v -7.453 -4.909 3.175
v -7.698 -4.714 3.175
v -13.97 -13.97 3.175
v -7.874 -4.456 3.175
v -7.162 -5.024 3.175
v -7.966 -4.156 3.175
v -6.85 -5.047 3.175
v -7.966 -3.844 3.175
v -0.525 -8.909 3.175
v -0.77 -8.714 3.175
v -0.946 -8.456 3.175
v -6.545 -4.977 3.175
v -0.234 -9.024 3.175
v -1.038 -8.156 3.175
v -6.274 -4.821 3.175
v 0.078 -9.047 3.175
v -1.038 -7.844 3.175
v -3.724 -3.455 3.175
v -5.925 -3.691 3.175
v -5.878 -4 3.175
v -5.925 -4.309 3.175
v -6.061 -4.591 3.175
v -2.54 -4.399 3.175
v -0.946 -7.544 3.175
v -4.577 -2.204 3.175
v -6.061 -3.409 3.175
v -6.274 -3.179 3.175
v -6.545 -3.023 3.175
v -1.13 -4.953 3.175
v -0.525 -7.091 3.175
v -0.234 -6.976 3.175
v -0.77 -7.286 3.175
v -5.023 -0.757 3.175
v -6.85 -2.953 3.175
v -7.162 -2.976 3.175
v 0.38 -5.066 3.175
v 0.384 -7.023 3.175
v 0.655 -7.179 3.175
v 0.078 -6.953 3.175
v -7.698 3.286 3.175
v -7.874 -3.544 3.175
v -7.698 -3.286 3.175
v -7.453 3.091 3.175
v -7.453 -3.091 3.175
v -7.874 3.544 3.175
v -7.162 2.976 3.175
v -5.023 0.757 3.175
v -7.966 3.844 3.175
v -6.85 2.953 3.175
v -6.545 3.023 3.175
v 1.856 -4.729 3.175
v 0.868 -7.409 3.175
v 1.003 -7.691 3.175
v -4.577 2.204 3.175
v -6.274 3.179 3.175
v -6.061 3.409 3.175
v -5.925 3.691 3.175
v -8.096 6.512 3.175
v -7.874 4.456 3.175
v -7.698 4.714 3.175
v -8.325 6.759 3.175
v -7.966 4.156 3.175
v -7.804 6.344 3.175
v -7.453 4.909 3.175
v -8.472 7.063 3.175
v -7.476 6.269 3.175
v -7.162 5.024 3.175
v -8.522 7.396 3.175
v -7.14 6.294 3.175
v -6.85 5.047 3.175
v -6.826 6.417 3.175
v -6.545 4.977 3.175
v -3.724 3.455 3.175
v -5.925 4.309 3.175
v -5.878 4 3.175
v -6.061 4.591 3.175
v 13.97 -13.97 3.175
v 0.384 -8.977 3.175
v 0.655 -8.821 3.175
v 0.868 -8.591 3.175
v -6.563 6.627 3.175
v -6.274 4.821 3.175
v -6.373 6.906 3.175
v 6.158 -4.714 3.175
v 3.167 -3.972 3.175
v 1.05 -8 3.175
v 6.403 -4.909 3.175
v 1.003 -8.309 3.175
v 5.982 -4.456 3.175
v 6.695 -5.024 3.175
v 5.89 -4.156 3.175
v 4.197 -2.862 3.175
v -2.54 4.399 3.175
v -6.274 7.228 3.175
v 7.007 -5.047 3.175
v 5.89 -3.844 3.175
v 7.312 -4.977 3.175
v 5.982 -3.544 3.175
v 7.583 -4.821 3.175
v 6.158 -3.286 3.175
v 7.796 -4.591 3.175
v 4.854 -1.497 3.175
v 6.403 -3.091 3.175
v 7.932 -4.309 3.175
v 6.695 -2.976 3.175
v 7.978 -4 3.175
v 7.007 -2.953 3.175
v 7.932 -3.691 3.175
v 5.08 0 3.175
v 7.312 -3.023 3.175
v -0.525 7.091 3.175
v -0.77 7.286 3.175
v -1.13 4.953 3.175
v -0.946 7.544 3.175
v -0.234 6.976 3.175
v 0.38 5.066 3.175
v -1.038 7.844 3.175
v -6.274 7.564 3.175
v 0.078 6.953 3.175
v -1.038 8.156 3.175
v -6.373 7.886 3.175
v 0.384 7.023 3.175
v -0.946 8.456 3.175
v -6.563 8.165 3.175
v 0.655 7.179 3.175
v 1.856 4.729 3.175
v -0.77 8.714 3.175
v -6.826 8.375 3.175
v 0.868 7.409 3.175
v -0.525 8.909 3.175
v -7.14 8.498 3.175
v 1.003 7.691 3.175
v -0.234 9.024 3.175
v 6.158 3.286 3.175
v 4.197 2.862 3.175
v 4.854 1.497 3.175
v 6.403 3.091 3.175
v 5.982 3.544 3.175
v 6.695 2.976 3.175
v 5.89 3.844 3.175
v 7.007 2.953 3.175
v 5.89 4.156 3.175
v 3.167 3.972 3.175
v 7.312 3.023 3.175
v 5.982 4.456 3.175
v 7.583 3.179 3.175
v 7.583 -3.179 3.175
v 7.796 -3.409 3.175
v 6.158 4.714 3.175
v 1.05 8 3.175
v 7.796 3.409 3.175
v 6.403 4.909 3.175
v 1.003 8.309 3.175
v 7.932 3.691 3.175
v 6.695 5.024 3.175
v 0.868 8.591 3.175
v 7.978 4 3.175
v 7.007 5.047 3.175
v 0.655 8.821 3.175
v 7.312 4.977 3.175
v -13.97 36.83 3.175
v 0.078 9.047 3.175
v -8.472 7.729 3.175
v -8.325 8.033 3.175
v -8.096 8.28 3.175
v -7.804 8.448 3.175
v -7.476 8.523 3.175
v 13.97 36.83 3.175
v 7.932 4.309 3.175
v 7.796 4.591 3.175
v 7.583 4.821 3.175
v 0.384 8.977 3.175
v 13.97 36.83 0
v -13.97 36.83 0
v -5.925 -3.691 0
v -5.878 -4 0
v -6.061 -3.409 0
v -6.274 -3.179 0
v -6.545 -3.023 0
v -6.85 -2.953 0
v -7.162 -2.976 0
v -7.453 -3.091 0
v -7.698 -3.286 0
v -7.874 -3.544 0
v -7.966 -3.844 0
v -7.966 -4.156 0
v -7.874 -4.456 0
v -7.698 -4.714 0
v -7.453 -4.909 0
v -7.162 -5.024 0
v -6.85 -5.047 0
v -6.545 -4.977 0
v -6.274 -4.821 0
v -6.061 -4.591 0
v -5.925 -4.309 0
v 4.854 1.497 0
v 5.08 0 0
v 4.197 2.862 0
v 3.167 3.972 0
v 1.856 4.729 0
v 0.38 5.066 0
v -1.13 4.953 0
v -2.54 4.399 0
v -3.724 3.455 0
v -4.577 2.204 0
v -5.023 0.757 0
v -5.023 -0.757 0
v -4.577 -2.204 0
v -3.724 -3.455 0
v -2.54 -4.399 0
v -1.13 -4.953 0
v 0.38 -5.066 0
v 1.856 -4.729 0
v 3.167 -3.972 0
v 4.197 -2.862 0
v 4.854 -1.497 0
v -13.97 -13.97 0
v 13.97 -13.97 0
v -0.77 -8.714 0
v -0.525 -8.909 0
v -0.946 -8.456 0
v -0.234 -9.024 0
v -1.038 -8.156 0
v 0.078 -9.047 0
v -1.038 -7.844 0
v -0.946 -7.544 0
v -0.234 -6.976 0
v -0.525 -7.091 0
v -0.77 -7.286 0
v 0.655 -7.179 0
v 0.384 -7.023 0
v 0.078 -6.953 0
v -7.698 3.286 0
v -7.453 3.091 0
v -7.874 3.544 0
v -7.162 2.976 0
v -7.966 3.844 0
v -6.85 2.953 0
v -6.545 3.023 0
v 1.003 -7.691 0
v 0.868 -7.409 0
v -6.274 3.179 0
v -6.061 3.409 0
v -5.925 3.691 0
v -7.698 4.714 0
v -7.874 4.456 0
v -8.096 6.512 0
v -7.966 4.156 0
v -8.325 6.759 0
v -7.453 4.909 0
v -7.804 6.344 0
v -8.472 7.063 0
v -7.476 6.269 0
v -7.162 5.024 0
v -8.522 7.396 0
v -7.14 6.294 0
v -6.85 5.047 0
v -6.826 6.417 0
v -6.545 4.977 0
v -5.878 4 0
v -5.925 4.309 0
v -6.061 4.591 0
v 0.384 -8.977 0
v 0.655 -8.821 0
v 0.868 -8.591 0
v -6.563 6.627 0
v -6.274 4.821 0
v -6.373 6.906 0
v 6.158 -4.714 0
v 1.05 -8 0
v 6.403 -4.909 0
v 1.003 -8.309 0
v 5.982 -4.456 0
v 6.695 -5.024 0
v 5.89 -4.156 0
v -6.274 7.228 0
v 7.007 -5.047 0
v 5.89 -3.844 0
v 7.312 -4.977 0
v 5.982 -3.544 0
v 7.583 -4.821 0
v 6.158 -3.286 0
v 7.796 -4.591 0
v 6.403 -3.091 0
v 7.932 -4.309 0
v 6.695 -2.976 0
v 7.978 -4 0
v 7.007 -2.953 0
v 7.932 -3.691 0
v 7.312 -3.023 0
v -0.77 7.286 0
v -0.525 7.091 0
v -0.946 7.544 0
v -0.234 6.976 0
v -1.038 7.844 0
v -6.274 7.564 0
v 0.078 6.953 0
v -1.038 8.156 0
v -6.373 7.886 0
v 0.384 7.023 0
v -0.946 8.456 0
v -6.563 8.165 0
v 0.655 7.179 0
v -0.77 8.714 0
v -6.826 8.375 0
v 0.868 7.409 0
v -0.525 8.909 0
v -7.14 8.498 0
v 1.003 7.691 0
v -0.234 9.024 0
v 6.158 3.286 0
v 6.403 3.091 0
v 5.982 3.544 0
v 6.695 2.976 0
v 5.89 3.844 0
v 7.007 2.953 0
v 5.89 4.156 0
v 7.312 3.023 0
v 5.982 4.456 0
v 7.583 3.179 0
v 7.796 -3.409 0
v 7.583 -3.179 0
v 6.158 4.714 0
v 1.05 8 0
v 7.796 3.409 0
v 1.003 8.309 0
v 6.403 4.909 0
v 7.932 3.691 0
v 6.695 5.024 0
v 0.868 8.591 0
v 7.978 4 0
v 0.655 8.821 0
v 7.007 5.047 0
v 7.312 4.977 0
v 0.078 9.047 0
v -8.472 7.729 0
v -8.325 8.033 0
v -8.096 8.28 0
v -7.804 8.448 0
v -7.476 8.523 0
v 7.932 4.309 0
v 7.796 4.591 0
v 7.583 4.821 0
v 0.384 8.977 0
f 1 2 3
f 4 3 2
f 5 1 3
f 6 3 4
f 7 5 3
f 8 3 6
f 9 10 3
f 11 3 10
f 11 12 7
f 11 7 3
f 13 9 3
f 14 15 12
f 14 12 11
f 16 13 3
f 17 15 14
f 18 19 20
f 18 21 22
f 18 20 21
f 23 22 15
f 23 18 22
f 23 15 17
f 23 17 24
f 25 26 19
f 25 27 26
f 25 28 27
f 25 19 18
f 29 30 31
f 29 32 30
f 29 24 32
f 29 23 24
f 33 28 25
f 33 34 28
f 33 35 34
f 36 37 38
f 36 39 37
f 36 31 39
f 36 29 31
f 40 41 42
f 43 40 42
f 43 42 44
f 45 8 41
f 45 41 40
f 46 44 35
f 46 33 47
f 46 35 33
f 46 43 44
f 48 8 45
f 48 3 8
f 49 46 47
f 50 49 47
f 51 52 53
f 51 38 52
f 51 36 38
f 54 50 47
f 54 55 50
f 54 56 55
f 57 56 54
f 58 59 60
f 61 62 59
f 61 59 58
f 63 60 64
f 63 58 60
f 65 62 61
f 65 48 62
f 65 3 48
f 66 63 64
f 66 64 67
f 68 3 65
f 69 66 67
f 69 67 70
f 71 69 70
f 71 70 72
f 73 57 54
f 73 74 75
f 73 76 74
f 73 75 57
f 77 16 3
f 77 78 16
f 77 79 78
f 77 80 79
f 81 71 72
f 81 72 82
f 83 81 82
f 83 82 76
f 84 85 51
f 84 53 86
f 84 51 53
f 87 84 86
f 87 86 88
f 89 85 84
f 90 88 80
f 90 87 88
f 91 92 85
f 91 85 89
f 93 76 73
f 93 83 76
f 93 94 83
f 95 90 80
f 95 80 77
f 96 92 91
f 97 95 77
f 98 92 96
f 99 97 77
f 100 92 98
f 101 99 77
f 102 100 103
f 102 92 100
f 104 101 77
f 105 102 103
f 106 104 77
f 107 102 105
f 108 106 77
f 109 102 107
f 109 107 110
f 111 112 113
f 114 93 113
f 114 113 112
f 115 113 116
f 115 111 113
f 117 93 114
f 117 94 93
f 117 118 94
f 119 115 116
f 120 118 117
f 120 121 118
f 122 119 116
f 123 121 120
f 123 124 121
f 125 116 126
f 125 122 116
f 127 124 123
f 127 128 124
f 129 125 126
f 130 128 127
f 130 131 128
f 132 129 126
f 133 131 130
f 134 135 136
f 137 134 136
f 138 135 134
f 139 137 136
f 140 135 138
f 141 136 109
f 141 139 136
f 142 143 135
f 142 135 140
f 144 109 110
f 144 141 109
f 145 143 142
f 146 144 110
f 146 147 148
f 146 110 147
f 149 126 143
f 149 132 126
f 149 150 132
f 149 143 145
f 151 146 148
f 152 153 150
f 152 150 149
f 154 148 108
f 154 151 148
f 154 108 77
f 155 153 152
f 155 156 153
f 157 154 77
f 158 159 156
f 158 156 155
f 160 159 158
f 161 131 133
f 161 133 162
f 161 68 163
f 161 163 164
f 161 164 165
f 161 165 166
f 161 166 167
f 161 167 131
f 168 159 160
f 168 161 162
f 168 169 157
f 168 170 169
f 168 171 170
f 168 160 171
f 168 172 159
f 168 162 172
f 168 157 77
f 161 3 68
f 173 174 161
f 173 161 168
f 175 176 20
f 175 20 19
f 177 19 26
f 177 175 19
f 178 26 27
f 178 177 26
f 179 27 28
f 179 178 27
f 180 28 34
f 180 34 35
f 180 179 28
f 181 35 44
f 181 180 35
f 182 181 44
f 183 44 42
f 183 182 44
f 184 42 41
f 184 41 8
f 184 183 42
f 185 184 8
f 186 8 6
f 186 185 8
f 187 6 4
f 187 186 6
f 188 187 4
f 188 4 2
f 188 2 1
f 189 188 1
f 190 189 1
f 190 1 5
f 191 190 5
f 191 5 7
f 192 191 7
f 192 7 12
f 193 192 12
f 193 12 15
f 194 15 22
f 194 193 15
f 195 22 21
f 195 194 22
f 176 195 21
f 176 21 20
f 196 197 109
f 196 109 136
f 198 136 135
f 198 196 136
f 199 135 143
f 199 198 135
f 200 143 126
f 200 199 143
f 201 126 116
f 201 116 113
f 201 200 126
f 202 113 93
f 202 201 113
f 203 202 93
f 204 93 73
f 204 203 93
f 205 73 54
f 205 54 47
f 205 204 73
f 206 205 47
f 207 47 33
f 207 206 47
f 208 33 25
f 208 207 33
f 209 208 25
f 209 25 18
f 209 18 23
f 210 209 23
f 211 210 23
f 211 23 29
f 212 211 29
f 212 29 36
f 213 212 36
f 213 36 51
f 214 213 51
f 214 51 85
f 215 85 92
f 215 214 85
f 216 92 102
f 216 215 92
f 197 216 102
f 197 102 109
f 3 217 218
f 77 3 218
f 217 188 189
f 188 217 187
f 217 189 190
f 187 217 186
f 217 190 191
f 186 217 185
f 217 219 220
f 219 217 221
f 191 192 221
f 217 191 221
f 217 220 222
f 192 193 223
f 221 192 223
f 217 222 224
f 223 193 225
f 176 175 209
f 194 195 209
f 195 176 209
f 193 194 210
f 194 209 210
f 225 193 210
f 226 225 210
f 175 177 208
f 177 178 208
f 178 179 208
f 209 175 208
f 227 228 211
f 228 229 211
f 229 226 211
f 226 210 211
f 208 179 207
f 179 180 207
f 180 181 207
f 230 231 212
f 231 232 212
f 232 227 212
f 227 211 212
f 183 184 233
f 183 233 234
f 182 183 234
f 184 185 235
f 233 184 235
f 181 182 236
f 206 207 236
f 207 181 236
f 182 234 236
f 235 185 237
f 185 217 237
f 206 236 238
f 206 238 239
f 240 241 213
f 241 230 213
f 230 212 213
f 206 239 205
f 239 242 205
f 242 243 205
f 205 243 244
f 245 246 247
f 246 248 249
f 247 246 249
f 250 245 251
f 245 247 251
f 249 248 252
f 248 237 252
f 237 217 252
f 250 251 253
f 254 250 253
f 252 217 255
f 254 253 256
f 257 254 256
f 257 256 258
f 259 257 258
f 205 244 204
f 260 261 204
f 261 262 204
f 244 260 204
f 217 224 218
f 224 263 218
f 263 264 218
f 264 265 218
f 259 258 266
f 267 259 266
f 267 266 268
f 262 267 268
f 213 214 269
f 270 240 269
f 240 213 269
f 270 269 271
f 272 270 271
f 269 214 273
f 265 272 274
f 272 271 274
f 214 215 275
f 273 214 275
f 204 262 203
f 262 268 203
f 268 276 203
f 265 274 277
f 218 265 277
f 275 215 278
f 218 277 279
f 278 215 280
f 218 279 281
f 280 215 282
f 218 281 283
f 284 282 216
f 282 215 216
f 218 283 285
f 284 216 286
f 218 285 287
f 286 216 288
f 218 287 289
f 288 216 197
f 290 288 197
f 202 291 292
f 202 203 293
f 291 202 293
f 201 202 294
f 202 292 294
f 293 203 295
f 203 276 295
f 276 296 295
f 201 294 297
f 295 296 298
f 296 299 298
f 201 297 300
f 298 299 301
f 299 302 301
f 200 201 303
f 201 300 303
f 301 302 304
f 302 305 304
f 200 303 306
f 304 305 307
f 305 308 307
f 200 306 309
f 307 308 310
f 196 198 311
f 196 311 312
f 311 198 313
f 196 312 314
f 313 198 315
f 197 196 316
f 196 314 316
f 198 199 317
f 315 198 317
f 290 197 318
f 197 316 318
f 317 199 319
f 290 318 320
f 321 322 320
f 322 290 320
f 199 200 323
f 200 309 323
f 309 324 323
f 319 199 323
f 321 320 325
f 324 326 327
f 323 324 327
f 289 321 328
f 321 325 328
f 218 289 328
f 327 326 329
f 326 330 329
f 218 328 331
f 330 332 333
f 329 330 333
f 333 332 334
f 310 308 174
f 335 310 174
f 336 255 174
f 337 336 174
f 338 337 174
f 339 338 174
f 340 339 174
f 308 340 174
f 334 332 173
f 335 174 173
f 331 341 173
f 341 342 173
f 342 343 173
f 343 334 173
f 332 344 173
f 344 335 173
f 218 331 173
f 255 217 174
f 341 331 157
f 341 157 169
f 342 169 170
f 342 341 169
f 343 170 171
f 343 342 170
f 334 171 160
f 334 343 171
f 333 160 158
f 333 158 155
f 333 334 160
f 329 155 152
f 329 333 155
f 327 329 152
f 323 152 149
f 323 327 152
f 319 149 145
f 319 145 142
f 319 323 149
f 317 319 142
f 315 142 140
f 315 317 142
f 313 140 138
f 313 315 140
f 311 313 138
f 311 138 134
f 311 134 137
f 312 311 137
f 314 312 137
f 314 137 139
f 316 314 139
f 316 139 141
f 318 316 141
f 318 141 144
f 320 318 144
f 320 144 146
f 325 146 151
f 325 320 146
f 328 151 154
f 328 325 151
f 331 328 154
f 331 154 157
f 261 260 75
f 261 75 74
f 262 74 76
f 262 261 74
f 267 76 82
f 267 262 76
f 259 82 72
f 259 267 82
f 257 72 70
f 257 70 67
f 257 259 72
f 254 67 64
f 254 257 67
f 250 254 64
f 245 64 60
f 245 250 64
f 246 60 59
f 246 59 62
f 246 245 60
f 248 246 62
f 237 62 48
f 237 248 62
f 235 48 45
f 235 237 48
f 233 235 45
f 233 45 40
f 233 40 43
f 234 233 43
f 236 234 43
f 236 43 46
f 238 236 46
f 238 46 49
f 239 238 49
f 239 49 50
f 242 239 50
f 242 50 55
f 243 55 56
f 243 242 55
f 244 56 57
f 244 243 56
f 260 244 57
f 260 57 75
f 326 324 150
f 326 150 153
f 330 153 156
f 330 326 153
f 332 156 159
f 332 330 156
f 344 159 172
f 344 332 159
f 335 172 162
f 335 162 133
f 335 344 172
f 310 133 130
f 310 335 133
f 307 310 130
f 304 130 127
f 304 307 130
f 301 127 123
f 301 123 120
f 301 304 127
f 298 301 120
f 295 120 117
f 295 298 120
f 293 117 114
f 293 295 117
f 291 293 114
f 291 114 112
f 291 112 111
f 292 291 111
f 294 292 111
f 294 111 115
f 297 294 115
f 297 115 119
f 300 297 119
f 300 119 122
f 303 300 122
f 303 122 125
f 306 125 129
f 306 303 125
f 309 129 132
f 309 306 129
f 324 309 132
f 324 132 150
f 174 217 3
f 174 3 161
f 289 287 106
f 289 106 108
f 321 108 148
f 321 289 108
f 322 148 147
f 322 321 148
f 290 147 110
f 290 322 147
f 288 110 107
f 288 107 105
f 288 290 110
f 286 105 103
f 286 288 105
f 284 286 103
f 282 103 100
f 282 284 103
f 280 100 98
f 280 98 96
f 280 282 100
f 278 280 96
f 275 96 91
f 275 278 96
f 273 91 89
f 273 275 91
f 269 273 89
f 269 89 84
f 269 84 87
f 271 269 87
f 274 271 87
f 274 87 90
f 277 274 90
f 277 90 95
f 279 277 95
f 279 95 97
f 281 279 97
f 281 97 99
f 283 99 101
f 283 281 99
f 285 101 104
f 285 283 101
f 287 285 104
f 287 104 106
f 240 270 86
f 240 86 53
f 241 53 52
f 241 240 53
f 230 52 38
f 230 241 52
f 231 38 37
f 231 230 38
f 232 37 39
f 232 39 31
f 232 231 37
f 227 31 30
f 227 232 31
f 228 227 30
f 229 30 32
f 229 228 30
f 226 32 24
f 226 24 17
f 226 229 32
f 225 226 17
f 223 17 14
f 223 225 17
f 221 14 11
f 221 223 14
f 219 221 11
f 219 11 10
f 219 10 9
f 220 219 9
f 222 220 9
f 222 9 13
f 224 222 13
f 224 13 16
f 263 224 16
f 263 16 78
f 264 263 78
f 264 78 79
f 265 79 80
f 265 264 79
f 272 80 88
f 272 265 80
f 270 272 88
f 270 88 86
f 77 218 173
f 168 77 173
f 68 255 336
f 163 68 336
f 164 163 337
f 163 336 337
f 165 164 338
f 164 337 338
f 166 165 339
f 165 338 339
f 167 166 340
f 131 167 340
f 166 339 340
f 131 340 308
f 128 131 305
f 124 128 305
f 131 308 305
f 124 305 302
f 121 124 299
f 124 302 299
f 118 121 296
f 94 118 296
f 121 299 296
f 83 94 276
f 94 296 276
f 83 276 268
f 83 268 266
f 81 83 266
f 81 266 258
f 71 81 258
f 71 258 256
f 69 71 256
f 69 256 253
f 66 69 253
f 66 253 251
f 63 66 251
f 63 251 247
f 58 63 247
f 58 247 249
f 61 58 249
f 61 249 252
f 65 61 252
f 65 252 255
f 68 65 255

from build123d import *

# Parameters (mm, degrees)
MODEL_W                         = 27.94
MODEL_H                         = 50.8
MODEL_R                         = 1.05
MODEL_R_2                       = 5.08
BOSS_EXTRUDE1_DEPTH             = 3.175
F_43_0_089_DIAMETER_HOLE1_D     = 2.2606
F_43_0_089_DIAMETER_HOLE1_DEPTH = 25.4
F_43_0_089_DIAMETER_HOLE1_TIP   = 0.679152758


with BuildPart() as part:
    # Model → Boss-Extrude1 (new body)
    with BuildSketch(Plane.XY):
        with Locations((0, 11.43)):
            Rectangle(MODEL_W, MODEL_H)
        with Locations((-6.92820323, 4.000000001)):
            Circle(MODEL_R, mode=Mode.SUBTRACT)
        with Locations((-6.92820323, -4.000000001)):
            Circle(MODEL_R, mode=Mode.SUBTRACT)
        with Locations((0, -7.999999999)):
            Circle(MODEL_R, mode=Mode.SUBTRACT)
        with Locations((6.92820323, -4.000000001)):
            Circle(MODEL_R, mode=Mode.SUBTRACT)
        with Locations((6.92820323, 4.000000001)):
            Circle(MODEL_R, mode=Mode.SUBTRACT)
        with Locations((0, 7.999999999)):
            Circle(MODEL_R, mode=Mode.SUBTRACT)
        Circle(MODEL_R_2, mode=Mode.SUBTRACT)
    extrude(amount=BOSS_EXTRUDE1_DEPTH)

    # #43 (0.089) Diameter Hole1
    with Locations(Plane.XY.offset(3.175)):
        with Locations((-7.39143302, 7.395974597)):
            Hole(F_43_0_089_DIAMETER_HOLE1_D / 2, depth=F_43_0_089_DIAMETER_HOLE1_DEPTH)
            with Locations((0, 0, -(F_43_0_089_DIAMETER_HOLE1_DEPTH + F_43_0_089_DIAMETER_HOLE1_TIP / 2))):  # 118° drill point
                Cone(0, F_43_0_089_DIAMETER_HOLE1_D / 2, F_43_0_089_DIAMETER_HOLE1_TIP, mode=Mode.SUBTRACT)


solid = part.part
